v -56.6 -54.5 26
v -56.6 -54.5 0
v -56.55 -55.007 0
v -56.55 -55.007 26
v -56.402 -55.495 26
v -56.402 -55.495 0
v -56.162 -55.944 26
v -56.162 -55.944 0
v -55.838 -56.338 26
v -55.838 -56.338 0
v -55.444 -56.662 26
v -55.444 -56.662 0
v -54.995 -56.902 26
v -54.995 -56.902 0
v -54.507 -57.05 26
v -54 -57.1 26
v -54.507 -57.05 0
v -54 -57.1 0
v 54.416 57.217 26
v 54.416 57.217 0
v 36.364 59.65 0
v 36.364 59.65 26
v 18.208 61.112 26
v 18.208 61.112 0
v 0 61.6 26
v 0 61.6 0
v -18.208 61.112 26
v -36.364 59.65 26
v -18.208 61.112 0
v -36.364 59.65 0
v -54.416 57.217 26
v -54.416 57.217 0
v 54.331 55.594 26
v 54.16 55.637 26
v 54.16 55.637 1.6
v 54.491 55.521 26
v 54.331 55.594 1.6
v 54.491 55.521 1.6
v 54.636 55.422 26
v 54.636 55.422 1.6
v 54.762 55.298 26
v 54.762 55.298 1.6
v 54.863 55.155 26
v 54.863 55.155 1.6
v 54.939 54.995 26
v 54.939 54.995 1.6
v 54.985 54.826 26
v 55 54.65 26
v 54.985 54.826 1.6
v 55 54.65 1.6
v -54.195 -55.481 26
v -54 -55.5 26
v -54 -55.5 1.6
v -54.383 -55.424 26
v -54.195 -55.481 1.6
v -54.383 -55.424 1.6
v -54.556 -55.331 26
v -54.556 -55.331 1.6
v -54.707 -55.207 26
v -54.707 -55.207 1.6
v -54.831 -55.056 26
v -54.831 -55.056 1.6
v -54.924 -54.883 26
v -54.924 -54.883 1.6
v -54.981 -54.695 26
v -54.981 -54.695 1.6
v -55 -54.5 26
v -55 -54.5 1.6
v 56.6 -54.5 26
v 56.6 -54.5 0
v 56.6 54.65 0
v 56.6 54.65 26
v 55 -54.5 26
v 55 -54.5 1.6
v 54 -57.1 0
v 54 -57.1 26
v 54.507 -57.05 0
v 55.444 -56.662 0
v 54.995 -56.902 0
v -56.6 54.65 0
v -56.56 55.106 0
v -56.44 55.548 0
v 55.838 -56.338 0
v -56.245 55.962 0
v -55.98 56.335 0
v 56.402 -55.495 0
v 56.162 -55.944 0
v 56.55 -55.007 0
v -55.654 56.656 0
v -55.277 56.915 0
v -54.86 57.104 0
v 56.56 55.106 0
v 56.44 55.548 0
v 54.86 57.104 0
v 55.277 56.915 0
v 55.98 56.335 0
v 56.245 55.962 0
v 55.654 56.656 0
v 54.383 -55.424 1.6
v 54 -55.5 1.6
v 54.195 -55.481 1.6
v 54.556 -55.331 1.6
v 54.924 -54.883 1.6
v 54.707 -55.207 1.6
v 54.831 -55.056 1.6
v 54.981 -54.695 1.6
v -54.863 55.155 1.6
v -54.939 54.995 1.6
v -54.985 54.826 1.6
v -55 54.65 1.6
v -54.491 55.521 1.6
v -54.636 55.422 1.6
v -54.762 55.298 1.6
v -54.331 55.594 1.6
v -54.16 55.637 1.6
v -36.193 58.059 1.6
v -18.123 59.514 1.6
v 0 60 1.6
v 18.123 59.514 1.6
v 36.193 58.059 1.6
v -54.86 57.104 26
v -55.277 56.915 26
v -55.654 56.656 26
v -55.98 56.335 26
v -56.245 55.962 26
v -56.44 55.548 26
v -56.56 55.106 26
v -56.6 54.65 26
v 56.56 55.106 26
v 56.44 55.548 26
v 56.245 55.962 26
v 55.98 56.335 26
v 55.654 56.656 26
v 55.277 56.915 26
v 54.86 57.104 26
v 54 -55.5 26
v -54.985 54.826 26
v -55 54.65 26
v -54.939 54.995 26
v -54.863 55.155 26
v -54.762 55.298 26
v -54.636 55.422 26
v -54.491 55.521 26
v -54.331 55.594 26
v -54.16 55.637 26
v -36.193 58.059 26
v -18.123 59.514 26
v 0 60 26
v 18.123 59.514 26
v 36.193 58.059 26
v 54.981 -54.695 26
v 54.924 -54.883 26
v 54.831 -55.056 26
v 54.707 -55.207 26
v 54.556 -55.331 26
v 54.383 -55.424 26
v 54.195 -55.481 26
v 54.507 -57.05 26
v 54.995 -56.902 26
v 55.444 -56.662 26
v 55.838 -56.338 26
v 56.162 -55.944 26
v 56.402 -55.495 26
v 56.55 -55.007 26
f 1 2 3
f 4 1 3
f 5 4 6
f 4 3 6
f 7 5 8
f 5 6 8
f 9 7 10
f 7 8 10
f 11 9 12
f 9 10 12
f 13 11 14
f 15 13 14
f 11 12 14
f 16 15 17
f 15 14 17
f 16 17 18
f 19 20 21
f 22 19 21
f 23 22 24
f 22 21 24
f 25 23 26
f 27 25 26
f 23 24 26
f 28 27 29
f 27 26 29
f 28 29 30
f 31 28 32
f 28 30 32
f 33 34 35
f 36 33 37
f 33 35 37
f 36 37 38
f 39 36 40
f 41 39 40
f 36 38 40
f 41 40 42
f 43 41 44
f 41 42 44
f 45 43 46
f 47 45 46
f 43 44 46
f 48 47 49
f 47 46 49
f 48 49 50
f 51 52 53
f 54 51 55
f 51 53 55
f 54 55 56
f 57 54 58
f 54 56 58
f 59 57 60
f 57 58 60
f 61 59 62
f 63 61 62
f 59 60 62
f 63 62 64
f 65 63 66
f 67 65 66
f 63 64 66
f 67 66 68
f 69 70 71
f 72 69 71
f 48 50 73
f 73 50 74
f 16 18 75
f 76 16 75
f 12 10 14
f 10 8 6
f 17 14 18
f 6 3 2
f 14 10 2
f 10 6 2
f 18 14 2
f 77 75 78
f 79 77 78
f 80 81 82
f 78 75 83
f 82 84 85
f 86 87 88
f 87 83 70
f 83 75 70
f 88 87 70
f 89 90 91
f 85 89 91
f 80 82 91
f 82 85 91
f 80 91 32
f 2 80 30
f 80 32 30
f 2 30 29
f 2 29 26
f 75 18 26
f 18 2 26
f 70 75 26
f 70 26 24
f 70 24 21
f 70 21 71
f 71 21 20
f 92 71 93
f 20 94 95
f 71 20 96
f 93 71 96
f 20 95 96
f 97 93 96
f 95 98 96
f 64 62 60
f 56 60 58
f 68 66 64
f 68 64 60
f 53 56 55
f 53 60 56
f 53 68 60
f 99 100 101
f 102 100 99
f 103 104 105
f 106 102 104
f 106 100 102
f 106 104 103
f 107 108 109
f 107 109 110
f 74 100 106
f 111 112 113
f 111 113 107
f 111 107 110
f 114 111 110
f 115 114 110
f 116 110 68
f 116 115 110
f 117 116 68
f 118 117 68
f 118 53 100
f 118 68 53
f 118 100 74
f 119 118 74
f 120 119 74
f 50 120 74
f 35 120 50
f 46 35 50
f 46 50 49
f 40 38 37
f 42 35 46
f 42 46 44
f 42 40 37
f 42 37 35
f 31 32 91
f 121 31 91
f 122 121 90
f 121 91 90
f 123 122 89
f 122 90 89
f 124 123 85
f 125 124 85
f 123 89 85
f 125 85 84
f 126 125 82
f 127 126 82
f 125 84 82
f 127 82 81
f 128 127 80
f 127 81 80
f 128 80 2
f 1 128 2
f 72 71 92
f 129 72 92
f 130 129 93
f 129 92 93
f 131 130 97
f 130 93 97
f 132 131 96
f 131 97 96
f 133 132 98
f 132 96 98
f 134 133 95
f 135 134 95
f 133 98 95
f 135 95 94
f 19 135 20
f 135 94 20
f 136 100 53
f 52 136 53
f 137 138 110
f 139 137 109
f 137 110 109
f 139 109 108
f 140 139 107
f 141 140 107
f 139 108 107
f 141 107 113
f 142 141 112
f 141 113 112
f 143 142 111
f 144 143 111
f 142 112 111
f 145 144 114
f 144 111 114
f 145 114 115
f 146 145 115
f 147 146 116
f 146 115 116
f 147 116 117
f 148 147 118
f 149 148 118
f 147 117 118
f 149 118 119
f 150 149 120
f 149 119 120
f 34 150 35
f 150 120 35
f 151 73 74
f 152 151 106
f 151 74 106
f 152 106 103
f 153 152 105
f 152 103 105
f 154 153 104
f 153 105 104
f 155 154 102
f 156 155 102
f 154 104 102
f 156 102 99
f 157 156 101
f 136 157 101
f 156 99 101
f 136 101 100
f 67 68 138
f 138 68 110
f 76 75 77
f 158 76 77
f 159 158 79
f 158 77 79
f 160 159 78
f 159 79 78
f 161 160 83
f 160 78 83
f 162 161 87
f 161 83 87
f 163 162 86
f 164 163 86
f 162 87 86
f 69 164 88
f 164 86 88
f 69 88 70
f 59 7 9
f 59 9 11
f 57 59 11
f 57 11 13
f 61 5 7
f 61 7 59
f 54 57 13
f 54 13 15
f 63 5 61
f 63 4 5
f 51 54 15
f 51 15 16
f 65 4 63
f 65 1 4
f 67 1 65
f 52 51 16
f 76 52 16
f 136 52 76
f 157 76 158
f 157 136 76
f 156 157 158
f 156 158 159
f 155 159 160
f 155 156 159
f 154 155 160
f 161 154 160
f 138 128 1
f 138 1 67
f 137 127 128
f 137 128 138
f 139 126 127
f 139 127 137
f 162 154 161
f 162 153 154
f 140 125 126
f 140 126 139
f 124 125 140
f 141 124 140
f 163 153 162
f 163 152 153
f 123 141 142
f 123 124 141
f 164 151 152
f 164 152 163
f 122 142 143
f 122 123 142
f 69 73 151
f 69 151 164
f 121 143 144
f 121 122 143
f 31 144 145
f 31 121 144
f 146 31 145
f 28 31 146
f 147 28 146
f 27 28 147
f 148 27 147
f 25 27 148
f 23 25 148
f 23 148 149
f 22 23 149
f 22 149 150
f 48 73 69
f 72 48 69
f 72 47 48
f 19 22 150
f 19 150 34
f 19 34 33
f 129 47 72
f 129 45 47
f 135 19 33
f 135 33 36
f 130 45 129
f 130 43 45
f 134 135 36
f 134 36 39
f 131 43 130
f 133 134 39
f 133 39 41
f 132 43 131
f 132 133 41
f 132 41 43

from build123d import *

# Parameters (mm, degrees)
F1_DEPTH = 26
F2_DEPTH = 1.6


with BuildPart() as f1:
    # F0 (on Top) → F1 (new body)
    with BuildSketch(Plane.XY):
        with BuildLine():
            ThreePointArc((54.416171, 57.216655), (0, 61.6), (-54.416171, 57.216655))
            ThreePointArc((-54.416171, 57.216655), (-55.980157, 56.335105), (-56.6, 54.650179))
            Line((-56.6, 54.650179), (-56.6, -54.5))
            ThreePointArc((-56.6, -54.5), (-55.838478, -56.338478), (-54, -57.1))
            Line((-54, -57.1), (54, -57.1))
            ThreePointArc((54, -57.1), (55.838478, -56.338478), (56.6, -54.5))
            Line((56.6, -54.5), (56.6, 54.650179))
            ThreePointArc((56.6, 54.650179), (55.980157, 56.335105), (54.416171, 57.216655))
        make_face()
        with BuildLine():
            Line((54, -55.5), (-54, -55.5))
            ThreePointArc((-54, -55.5), (-54.707107, -55.207107), (-55, -54.5))
            Line((-55, -54.5), (-55, 54.650179))
            ThreePointArc((-55, 54.650179), (-54.761599, 55.298228), (-54.160066, 55.637285))
            ThreePointArc((-54.160066, 55.637285), (0, 60), (54.160066, 55.637285))
            ThreePointArc((54.160066, 55.637285), (54.761599, 55.298228), (55, 54.650179))
            Line((55, 54.650179), (55, -54.5))
            ThreePointArc((55, -54.5), (54.707107, -55.207107), (54, -55.5))
        make_face(mode=Mode.SUBTRACT)
    extrude(amount=F1_DEPTH)

    # F0 (on Top) → F2 (join)
    with BuildSketch(Plane.XY):
        with BuildLine():
            ThreePointArc((-55, -54.5), (-54.707107, -55.207107), (-54, -55.5))
            Line((-54, -55.5), (54, -55.5))
            ThreePointArc((54, -55.5), (54.707107, -55.207107), (55, -54.5))
            Line((55, -54.5), (55, 54.650179))
            ThreePointArc((55, 54.650179), (54.761599, 55.298228), (54.160066, 55.637285))
            ThreePointArc((54.160066, 55.637285), (0, 60), (-54.160066, 55.637285))
            ThreePointArc((-54.160066, 55.637285), (-54.761599, 55.298228), (-55, 54.650179))
            Line((-55, 54.650179), (-55, -54.5))
        make_face()
    extrude(amount=F2_DEPTH)


solid = f1.part
